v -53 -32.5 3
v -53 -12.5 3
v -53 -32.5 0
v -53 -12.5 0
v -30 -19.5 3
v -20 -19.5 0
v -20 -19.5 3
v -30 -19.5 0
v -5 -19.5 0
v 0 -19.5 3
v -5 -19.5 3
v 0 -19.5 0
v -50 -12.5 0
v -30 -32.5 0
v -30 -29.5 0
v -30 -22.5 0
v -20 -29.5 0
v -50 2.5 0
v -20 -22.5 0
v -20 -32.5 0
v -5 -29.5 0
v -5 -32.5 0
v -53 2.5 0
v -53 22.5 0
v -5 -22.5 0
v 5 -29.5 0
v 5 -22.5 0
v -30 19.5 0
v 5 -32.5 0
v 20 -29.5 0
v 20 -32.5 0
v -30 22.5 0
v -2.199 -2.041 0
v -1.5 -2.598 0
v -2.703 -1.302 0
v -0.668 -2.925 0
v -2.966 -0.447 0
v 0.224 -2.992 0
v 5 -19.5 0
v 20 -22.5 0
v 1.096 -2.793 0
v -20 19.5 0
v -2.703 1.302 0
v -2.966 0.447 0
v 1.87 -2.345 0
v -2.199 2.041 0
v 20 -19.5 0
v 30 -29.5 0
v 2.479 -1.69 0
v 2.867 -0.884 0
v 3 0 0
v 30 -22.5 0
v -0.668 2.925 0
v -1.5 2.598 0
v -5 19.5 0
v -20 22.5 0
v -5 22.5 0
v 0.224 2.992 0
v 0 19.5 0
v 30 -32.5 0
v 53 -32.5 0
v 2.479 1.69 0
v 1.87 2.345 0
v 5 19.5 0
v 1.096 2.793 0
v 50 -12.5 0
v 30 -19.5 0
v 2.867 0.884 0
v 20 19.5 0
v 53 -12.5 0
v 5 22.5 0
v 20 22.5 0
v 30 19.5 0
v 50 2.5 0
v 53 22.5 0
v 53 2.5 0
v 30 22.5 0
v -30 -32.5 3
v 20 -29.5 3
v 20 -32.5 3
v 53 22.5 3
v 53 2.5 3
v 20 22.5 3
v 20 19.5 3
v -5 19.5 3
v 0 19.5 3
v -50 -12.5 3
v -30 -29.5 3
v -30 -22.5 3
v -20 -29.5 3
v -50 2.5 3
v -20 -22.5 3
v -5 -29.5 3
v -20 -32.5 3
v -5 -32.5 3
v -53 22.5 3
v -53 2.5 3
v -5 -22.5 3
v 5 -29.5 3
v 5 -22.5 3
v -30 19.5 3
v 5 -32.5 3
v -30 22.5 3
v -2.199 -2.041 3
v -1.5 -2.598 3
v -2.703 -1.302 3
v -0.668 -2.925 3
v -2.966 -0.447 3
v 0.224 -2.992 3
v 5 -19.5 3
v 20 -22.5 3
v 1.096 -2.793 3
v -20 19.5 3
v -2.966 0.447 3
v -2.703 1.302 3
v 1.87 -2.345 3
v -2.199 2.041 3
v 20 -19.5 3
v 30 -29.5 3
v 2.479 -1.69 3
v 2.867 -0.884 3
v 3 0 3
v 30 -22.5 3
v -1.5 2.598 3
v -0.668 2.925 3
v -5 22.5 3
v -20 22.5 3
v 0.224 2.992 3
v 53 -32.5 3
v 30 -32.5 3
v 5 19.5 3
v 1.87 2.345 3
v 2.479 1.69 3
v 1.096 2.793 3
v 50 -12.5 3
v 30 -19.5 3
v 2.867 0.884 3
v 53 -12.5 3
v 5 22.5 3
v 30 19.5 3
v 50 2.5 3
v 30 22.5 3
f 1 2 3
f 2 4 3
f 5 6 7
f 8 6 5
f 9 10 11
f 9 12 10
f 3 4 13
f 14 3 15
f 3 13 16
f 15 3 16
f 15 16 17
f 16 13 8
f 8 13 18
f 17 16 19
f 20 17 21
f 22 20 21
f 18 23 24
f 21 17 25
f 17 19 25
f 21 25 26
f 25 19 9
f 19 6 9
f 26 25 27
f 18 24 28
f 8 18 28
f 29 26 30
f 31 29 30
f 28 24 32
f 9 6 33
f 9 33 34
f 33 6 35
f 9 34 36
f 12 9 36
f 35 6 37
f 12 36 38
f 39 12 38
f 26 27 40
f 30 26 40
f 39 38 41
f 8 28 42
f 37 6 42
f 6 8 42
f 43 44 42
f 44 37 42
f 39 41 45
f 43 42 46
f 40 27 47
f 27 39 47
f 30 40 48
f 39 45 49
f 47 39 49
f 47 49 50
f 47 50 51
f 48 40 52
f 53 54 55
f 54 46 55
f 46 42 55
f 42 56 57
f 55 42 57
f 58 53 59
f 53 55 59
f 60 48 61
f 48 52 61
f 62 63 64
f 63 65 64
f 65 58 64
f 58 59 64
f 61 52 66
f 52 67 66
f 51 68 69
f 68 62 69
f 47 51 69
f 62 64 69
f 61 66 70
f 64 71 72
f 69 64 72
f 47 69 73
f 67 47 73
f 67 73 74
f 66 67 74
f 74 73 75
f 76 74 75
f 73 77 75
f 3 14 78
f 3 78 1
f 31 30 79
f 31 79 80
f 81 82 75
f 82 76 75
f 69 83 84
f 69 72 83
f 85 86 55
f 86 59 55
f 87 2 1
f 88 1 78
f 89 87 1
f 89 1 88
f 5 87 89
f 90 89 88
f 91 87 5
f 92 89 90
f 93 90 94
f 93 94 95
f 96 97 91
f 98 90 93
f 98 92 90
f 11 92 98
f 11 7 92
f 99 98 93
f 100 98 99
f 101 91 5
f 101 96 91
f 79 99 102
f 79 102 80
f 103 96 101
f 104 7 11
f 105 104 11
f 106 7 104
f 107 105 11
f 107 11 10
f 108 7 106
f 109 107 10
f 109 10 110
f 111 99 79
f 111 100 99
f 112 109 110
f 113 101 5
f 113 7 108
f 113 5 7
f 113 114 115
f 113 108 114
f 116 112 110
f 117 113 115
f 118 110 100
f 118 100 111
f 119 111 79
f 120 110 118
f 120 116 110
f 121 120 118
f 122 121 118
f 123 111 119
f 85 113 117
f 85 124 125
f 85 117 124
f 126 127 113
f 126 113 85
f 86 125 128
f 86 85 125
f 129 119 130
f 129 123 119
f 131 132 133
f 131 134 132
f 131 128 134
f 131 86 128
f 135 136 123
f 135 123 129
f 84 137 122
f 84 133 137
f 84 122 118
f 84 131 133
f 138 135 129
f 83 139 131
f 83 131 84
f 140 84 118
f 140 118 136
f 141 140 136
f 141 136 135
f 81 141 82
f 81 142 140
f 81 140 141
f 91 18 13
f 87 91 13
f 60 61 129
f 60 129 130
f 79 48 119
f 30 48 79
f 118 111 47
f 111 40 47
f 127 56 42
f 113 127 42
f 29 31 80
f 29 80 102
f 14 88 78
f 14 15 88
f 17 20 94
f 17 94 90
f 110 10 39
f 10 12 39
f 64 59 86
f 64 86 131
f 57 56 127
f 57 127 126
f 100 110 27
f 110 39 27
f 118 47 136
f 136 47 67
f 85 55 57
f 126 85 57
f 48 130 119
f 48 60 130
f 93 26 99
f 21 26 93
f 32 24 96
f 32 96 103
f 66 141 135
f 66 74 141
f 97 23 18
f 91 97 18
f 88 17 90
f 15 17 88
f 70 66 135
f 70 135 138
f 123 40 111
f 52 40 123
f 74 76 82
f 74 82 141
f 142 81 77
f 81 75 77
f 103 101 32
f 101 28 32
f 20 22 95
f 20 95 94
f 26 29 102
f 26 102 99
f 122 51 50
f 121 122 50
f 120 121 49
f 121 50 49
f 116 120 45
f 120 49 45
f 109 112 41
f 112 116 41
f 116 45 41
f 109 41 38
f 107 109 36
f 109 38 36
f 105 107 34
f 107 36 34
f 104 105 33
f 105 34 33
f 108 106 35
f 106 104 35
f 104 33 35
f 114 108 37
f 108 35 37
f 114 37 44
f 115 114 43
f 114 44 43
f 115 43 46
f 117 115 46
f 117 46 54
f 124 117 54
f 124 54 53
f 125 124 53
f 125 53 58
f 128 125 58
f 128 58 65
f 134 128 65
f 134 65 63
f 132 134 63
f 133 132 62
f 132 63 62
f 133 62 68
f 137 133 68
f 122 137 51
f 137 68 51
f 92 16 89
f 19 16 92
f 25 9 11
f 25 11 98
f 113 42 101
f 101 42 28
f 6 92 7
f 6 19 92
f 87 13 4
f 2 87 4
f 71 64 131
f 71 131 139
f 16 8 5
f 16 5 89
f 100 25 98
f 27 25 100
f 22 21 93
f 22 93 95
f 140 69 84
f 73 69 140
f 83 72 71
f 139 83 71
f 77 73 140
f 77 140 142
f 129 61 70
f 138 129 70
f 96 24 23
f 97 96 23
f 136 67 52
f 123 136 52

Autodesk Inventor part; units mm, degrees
ref_plane "YZ Plane" through (0, 0, 0) normal (1, 0, 0) x (0, 1, 0)
ref_plane "XZ Plane" through (0, 0, 0) normal (0, 1, 0) x (-1, 0, 0)
ref_plane "XY Plane" through (0, 0, 0) normal (0, 0, 1) x (1, 0, 0)
sketch "Эскиз1" plane through (0, 0, 0) normal (0, 0, 1) x (1, 0, 0)
  line L0 (-20, -22.5) -> (-20, -19.5)
  line L1 (-20, -19.5) -> (-30, -19.5)
  line L2 (-30, -19.5) -> (-30, -22.5)
  line L3 (0, -19.5) -> (-5, -19.5)
  line L4 (-5, -19.5) -> (-5, -22.5)
  line L5 (20, -22.5) -> (20, -19.5)
  line L6 (20, -19.5) -> (30, -19.5)
  line L7 (30, -19.5) -> (30, -22.5)
  line L8 (0, -19.5) -> (5, -19.5)
  line L9 (5, -19.5) -> (5, -22.5)
  line L10 (-53, 22.5) -> (-30, 22.5)
  line L11 (-20, 22.5) -> (-20, 19.5)
  line L12 (-20, 19.5) -> (-30, 19.5)
  line L13 (-30, 19.5) -> (-30, 22.5)
  line L14 (-20, 22.5) -> (-5, 22.5)
  line L15 (0, 19.5) -> (-5, 19.5)
  line L16 (-5, 19.5) -> (-5, 22.5)
  line L17 (-5, 22.5) -> (-20, 22.5)
  line L18 (-30, 22.5) -> (-53, 22.5)
  line L19 (53, 22.5) -> (30, 22.5)
  line L20 (20, 22.5) -> (20, 19.5)
  line L21 (20, 19.5) -> (30, 19.5)
  line L22 (30, 19.5) -> (30, 22.5)
  line L23 (20, 22.5) -> (5, 22.5)
  line L24 (0, 19.5) -> (5, 19.5)
  line L25 (5, 19.5) -> (5, 22.5)
  line L26 (5, 22.5) -> (20, 22.5)
  line L27 (30, 22.5) -> (53, 22.5)
  line L28 (-20, -32.5) -> (-20, -29.5)
  line L29 (-20, -29.5) -> (-30, -29.5)
  line L30 (-30, -29.5) -> (-30, -32.5)
  line L31 (5, -32.5) -> (5, -29.5)
  line L32 (5, -29.5) -> (-5, -29.5)
  line L33 (-5, -29.5) -> (-5, -32.5)
  line L34 (30, -32.5) -> (30, -29.5)
  line L35 (30, -29.5) -> (20, -29.5)
  line L36 (20, -29.5) -> (20, -32.5)
  line L37 (-30, -22.5) -> (-20, -22.5)
  line L38 (-5, -22.5) -> (5, -22.5)
  line L39 (20, -22.5) -> (30, -22.5)
  line L40 (-30, -32.5) -> (-53, -32.5)
  line L41 (-5, -32.5) -> (-20, -32.5)
  line L42 (53, -32.5) -> (30, -32.5)
  line L43 (20, -32.5) -> (5, -32.5)
  line L44 (-53, 2.5) -> (-50, 2.5)
  line L45 (-50, 2.5) -> (-50, -12.5)
  line L46 (-50, -12.5) -> (-53, -12.5)
  line L47 (53, 2.5) -> (50, 2.5)
  line L48 (50, 2.5) -> (50, -12.5)
  line L49 (50, -12.5) -> (53, -12.5)
  line L50 (-53, 22.5) -> (-53, 2.5)
  line L51 (-53, -12.5) -> (-53, -32.5)
  line L52 (53, -32.5) -> (53, -12.5)
  line L53 (53, 2.5) -> (53, 22.5)
  circle A0 centre (0, 0) radius 3
  dimension "d15" = 6
extrude "Выдавливание1" add sketch "Эскиз1" along normal blind 3
properties part number "Стенка t2"
